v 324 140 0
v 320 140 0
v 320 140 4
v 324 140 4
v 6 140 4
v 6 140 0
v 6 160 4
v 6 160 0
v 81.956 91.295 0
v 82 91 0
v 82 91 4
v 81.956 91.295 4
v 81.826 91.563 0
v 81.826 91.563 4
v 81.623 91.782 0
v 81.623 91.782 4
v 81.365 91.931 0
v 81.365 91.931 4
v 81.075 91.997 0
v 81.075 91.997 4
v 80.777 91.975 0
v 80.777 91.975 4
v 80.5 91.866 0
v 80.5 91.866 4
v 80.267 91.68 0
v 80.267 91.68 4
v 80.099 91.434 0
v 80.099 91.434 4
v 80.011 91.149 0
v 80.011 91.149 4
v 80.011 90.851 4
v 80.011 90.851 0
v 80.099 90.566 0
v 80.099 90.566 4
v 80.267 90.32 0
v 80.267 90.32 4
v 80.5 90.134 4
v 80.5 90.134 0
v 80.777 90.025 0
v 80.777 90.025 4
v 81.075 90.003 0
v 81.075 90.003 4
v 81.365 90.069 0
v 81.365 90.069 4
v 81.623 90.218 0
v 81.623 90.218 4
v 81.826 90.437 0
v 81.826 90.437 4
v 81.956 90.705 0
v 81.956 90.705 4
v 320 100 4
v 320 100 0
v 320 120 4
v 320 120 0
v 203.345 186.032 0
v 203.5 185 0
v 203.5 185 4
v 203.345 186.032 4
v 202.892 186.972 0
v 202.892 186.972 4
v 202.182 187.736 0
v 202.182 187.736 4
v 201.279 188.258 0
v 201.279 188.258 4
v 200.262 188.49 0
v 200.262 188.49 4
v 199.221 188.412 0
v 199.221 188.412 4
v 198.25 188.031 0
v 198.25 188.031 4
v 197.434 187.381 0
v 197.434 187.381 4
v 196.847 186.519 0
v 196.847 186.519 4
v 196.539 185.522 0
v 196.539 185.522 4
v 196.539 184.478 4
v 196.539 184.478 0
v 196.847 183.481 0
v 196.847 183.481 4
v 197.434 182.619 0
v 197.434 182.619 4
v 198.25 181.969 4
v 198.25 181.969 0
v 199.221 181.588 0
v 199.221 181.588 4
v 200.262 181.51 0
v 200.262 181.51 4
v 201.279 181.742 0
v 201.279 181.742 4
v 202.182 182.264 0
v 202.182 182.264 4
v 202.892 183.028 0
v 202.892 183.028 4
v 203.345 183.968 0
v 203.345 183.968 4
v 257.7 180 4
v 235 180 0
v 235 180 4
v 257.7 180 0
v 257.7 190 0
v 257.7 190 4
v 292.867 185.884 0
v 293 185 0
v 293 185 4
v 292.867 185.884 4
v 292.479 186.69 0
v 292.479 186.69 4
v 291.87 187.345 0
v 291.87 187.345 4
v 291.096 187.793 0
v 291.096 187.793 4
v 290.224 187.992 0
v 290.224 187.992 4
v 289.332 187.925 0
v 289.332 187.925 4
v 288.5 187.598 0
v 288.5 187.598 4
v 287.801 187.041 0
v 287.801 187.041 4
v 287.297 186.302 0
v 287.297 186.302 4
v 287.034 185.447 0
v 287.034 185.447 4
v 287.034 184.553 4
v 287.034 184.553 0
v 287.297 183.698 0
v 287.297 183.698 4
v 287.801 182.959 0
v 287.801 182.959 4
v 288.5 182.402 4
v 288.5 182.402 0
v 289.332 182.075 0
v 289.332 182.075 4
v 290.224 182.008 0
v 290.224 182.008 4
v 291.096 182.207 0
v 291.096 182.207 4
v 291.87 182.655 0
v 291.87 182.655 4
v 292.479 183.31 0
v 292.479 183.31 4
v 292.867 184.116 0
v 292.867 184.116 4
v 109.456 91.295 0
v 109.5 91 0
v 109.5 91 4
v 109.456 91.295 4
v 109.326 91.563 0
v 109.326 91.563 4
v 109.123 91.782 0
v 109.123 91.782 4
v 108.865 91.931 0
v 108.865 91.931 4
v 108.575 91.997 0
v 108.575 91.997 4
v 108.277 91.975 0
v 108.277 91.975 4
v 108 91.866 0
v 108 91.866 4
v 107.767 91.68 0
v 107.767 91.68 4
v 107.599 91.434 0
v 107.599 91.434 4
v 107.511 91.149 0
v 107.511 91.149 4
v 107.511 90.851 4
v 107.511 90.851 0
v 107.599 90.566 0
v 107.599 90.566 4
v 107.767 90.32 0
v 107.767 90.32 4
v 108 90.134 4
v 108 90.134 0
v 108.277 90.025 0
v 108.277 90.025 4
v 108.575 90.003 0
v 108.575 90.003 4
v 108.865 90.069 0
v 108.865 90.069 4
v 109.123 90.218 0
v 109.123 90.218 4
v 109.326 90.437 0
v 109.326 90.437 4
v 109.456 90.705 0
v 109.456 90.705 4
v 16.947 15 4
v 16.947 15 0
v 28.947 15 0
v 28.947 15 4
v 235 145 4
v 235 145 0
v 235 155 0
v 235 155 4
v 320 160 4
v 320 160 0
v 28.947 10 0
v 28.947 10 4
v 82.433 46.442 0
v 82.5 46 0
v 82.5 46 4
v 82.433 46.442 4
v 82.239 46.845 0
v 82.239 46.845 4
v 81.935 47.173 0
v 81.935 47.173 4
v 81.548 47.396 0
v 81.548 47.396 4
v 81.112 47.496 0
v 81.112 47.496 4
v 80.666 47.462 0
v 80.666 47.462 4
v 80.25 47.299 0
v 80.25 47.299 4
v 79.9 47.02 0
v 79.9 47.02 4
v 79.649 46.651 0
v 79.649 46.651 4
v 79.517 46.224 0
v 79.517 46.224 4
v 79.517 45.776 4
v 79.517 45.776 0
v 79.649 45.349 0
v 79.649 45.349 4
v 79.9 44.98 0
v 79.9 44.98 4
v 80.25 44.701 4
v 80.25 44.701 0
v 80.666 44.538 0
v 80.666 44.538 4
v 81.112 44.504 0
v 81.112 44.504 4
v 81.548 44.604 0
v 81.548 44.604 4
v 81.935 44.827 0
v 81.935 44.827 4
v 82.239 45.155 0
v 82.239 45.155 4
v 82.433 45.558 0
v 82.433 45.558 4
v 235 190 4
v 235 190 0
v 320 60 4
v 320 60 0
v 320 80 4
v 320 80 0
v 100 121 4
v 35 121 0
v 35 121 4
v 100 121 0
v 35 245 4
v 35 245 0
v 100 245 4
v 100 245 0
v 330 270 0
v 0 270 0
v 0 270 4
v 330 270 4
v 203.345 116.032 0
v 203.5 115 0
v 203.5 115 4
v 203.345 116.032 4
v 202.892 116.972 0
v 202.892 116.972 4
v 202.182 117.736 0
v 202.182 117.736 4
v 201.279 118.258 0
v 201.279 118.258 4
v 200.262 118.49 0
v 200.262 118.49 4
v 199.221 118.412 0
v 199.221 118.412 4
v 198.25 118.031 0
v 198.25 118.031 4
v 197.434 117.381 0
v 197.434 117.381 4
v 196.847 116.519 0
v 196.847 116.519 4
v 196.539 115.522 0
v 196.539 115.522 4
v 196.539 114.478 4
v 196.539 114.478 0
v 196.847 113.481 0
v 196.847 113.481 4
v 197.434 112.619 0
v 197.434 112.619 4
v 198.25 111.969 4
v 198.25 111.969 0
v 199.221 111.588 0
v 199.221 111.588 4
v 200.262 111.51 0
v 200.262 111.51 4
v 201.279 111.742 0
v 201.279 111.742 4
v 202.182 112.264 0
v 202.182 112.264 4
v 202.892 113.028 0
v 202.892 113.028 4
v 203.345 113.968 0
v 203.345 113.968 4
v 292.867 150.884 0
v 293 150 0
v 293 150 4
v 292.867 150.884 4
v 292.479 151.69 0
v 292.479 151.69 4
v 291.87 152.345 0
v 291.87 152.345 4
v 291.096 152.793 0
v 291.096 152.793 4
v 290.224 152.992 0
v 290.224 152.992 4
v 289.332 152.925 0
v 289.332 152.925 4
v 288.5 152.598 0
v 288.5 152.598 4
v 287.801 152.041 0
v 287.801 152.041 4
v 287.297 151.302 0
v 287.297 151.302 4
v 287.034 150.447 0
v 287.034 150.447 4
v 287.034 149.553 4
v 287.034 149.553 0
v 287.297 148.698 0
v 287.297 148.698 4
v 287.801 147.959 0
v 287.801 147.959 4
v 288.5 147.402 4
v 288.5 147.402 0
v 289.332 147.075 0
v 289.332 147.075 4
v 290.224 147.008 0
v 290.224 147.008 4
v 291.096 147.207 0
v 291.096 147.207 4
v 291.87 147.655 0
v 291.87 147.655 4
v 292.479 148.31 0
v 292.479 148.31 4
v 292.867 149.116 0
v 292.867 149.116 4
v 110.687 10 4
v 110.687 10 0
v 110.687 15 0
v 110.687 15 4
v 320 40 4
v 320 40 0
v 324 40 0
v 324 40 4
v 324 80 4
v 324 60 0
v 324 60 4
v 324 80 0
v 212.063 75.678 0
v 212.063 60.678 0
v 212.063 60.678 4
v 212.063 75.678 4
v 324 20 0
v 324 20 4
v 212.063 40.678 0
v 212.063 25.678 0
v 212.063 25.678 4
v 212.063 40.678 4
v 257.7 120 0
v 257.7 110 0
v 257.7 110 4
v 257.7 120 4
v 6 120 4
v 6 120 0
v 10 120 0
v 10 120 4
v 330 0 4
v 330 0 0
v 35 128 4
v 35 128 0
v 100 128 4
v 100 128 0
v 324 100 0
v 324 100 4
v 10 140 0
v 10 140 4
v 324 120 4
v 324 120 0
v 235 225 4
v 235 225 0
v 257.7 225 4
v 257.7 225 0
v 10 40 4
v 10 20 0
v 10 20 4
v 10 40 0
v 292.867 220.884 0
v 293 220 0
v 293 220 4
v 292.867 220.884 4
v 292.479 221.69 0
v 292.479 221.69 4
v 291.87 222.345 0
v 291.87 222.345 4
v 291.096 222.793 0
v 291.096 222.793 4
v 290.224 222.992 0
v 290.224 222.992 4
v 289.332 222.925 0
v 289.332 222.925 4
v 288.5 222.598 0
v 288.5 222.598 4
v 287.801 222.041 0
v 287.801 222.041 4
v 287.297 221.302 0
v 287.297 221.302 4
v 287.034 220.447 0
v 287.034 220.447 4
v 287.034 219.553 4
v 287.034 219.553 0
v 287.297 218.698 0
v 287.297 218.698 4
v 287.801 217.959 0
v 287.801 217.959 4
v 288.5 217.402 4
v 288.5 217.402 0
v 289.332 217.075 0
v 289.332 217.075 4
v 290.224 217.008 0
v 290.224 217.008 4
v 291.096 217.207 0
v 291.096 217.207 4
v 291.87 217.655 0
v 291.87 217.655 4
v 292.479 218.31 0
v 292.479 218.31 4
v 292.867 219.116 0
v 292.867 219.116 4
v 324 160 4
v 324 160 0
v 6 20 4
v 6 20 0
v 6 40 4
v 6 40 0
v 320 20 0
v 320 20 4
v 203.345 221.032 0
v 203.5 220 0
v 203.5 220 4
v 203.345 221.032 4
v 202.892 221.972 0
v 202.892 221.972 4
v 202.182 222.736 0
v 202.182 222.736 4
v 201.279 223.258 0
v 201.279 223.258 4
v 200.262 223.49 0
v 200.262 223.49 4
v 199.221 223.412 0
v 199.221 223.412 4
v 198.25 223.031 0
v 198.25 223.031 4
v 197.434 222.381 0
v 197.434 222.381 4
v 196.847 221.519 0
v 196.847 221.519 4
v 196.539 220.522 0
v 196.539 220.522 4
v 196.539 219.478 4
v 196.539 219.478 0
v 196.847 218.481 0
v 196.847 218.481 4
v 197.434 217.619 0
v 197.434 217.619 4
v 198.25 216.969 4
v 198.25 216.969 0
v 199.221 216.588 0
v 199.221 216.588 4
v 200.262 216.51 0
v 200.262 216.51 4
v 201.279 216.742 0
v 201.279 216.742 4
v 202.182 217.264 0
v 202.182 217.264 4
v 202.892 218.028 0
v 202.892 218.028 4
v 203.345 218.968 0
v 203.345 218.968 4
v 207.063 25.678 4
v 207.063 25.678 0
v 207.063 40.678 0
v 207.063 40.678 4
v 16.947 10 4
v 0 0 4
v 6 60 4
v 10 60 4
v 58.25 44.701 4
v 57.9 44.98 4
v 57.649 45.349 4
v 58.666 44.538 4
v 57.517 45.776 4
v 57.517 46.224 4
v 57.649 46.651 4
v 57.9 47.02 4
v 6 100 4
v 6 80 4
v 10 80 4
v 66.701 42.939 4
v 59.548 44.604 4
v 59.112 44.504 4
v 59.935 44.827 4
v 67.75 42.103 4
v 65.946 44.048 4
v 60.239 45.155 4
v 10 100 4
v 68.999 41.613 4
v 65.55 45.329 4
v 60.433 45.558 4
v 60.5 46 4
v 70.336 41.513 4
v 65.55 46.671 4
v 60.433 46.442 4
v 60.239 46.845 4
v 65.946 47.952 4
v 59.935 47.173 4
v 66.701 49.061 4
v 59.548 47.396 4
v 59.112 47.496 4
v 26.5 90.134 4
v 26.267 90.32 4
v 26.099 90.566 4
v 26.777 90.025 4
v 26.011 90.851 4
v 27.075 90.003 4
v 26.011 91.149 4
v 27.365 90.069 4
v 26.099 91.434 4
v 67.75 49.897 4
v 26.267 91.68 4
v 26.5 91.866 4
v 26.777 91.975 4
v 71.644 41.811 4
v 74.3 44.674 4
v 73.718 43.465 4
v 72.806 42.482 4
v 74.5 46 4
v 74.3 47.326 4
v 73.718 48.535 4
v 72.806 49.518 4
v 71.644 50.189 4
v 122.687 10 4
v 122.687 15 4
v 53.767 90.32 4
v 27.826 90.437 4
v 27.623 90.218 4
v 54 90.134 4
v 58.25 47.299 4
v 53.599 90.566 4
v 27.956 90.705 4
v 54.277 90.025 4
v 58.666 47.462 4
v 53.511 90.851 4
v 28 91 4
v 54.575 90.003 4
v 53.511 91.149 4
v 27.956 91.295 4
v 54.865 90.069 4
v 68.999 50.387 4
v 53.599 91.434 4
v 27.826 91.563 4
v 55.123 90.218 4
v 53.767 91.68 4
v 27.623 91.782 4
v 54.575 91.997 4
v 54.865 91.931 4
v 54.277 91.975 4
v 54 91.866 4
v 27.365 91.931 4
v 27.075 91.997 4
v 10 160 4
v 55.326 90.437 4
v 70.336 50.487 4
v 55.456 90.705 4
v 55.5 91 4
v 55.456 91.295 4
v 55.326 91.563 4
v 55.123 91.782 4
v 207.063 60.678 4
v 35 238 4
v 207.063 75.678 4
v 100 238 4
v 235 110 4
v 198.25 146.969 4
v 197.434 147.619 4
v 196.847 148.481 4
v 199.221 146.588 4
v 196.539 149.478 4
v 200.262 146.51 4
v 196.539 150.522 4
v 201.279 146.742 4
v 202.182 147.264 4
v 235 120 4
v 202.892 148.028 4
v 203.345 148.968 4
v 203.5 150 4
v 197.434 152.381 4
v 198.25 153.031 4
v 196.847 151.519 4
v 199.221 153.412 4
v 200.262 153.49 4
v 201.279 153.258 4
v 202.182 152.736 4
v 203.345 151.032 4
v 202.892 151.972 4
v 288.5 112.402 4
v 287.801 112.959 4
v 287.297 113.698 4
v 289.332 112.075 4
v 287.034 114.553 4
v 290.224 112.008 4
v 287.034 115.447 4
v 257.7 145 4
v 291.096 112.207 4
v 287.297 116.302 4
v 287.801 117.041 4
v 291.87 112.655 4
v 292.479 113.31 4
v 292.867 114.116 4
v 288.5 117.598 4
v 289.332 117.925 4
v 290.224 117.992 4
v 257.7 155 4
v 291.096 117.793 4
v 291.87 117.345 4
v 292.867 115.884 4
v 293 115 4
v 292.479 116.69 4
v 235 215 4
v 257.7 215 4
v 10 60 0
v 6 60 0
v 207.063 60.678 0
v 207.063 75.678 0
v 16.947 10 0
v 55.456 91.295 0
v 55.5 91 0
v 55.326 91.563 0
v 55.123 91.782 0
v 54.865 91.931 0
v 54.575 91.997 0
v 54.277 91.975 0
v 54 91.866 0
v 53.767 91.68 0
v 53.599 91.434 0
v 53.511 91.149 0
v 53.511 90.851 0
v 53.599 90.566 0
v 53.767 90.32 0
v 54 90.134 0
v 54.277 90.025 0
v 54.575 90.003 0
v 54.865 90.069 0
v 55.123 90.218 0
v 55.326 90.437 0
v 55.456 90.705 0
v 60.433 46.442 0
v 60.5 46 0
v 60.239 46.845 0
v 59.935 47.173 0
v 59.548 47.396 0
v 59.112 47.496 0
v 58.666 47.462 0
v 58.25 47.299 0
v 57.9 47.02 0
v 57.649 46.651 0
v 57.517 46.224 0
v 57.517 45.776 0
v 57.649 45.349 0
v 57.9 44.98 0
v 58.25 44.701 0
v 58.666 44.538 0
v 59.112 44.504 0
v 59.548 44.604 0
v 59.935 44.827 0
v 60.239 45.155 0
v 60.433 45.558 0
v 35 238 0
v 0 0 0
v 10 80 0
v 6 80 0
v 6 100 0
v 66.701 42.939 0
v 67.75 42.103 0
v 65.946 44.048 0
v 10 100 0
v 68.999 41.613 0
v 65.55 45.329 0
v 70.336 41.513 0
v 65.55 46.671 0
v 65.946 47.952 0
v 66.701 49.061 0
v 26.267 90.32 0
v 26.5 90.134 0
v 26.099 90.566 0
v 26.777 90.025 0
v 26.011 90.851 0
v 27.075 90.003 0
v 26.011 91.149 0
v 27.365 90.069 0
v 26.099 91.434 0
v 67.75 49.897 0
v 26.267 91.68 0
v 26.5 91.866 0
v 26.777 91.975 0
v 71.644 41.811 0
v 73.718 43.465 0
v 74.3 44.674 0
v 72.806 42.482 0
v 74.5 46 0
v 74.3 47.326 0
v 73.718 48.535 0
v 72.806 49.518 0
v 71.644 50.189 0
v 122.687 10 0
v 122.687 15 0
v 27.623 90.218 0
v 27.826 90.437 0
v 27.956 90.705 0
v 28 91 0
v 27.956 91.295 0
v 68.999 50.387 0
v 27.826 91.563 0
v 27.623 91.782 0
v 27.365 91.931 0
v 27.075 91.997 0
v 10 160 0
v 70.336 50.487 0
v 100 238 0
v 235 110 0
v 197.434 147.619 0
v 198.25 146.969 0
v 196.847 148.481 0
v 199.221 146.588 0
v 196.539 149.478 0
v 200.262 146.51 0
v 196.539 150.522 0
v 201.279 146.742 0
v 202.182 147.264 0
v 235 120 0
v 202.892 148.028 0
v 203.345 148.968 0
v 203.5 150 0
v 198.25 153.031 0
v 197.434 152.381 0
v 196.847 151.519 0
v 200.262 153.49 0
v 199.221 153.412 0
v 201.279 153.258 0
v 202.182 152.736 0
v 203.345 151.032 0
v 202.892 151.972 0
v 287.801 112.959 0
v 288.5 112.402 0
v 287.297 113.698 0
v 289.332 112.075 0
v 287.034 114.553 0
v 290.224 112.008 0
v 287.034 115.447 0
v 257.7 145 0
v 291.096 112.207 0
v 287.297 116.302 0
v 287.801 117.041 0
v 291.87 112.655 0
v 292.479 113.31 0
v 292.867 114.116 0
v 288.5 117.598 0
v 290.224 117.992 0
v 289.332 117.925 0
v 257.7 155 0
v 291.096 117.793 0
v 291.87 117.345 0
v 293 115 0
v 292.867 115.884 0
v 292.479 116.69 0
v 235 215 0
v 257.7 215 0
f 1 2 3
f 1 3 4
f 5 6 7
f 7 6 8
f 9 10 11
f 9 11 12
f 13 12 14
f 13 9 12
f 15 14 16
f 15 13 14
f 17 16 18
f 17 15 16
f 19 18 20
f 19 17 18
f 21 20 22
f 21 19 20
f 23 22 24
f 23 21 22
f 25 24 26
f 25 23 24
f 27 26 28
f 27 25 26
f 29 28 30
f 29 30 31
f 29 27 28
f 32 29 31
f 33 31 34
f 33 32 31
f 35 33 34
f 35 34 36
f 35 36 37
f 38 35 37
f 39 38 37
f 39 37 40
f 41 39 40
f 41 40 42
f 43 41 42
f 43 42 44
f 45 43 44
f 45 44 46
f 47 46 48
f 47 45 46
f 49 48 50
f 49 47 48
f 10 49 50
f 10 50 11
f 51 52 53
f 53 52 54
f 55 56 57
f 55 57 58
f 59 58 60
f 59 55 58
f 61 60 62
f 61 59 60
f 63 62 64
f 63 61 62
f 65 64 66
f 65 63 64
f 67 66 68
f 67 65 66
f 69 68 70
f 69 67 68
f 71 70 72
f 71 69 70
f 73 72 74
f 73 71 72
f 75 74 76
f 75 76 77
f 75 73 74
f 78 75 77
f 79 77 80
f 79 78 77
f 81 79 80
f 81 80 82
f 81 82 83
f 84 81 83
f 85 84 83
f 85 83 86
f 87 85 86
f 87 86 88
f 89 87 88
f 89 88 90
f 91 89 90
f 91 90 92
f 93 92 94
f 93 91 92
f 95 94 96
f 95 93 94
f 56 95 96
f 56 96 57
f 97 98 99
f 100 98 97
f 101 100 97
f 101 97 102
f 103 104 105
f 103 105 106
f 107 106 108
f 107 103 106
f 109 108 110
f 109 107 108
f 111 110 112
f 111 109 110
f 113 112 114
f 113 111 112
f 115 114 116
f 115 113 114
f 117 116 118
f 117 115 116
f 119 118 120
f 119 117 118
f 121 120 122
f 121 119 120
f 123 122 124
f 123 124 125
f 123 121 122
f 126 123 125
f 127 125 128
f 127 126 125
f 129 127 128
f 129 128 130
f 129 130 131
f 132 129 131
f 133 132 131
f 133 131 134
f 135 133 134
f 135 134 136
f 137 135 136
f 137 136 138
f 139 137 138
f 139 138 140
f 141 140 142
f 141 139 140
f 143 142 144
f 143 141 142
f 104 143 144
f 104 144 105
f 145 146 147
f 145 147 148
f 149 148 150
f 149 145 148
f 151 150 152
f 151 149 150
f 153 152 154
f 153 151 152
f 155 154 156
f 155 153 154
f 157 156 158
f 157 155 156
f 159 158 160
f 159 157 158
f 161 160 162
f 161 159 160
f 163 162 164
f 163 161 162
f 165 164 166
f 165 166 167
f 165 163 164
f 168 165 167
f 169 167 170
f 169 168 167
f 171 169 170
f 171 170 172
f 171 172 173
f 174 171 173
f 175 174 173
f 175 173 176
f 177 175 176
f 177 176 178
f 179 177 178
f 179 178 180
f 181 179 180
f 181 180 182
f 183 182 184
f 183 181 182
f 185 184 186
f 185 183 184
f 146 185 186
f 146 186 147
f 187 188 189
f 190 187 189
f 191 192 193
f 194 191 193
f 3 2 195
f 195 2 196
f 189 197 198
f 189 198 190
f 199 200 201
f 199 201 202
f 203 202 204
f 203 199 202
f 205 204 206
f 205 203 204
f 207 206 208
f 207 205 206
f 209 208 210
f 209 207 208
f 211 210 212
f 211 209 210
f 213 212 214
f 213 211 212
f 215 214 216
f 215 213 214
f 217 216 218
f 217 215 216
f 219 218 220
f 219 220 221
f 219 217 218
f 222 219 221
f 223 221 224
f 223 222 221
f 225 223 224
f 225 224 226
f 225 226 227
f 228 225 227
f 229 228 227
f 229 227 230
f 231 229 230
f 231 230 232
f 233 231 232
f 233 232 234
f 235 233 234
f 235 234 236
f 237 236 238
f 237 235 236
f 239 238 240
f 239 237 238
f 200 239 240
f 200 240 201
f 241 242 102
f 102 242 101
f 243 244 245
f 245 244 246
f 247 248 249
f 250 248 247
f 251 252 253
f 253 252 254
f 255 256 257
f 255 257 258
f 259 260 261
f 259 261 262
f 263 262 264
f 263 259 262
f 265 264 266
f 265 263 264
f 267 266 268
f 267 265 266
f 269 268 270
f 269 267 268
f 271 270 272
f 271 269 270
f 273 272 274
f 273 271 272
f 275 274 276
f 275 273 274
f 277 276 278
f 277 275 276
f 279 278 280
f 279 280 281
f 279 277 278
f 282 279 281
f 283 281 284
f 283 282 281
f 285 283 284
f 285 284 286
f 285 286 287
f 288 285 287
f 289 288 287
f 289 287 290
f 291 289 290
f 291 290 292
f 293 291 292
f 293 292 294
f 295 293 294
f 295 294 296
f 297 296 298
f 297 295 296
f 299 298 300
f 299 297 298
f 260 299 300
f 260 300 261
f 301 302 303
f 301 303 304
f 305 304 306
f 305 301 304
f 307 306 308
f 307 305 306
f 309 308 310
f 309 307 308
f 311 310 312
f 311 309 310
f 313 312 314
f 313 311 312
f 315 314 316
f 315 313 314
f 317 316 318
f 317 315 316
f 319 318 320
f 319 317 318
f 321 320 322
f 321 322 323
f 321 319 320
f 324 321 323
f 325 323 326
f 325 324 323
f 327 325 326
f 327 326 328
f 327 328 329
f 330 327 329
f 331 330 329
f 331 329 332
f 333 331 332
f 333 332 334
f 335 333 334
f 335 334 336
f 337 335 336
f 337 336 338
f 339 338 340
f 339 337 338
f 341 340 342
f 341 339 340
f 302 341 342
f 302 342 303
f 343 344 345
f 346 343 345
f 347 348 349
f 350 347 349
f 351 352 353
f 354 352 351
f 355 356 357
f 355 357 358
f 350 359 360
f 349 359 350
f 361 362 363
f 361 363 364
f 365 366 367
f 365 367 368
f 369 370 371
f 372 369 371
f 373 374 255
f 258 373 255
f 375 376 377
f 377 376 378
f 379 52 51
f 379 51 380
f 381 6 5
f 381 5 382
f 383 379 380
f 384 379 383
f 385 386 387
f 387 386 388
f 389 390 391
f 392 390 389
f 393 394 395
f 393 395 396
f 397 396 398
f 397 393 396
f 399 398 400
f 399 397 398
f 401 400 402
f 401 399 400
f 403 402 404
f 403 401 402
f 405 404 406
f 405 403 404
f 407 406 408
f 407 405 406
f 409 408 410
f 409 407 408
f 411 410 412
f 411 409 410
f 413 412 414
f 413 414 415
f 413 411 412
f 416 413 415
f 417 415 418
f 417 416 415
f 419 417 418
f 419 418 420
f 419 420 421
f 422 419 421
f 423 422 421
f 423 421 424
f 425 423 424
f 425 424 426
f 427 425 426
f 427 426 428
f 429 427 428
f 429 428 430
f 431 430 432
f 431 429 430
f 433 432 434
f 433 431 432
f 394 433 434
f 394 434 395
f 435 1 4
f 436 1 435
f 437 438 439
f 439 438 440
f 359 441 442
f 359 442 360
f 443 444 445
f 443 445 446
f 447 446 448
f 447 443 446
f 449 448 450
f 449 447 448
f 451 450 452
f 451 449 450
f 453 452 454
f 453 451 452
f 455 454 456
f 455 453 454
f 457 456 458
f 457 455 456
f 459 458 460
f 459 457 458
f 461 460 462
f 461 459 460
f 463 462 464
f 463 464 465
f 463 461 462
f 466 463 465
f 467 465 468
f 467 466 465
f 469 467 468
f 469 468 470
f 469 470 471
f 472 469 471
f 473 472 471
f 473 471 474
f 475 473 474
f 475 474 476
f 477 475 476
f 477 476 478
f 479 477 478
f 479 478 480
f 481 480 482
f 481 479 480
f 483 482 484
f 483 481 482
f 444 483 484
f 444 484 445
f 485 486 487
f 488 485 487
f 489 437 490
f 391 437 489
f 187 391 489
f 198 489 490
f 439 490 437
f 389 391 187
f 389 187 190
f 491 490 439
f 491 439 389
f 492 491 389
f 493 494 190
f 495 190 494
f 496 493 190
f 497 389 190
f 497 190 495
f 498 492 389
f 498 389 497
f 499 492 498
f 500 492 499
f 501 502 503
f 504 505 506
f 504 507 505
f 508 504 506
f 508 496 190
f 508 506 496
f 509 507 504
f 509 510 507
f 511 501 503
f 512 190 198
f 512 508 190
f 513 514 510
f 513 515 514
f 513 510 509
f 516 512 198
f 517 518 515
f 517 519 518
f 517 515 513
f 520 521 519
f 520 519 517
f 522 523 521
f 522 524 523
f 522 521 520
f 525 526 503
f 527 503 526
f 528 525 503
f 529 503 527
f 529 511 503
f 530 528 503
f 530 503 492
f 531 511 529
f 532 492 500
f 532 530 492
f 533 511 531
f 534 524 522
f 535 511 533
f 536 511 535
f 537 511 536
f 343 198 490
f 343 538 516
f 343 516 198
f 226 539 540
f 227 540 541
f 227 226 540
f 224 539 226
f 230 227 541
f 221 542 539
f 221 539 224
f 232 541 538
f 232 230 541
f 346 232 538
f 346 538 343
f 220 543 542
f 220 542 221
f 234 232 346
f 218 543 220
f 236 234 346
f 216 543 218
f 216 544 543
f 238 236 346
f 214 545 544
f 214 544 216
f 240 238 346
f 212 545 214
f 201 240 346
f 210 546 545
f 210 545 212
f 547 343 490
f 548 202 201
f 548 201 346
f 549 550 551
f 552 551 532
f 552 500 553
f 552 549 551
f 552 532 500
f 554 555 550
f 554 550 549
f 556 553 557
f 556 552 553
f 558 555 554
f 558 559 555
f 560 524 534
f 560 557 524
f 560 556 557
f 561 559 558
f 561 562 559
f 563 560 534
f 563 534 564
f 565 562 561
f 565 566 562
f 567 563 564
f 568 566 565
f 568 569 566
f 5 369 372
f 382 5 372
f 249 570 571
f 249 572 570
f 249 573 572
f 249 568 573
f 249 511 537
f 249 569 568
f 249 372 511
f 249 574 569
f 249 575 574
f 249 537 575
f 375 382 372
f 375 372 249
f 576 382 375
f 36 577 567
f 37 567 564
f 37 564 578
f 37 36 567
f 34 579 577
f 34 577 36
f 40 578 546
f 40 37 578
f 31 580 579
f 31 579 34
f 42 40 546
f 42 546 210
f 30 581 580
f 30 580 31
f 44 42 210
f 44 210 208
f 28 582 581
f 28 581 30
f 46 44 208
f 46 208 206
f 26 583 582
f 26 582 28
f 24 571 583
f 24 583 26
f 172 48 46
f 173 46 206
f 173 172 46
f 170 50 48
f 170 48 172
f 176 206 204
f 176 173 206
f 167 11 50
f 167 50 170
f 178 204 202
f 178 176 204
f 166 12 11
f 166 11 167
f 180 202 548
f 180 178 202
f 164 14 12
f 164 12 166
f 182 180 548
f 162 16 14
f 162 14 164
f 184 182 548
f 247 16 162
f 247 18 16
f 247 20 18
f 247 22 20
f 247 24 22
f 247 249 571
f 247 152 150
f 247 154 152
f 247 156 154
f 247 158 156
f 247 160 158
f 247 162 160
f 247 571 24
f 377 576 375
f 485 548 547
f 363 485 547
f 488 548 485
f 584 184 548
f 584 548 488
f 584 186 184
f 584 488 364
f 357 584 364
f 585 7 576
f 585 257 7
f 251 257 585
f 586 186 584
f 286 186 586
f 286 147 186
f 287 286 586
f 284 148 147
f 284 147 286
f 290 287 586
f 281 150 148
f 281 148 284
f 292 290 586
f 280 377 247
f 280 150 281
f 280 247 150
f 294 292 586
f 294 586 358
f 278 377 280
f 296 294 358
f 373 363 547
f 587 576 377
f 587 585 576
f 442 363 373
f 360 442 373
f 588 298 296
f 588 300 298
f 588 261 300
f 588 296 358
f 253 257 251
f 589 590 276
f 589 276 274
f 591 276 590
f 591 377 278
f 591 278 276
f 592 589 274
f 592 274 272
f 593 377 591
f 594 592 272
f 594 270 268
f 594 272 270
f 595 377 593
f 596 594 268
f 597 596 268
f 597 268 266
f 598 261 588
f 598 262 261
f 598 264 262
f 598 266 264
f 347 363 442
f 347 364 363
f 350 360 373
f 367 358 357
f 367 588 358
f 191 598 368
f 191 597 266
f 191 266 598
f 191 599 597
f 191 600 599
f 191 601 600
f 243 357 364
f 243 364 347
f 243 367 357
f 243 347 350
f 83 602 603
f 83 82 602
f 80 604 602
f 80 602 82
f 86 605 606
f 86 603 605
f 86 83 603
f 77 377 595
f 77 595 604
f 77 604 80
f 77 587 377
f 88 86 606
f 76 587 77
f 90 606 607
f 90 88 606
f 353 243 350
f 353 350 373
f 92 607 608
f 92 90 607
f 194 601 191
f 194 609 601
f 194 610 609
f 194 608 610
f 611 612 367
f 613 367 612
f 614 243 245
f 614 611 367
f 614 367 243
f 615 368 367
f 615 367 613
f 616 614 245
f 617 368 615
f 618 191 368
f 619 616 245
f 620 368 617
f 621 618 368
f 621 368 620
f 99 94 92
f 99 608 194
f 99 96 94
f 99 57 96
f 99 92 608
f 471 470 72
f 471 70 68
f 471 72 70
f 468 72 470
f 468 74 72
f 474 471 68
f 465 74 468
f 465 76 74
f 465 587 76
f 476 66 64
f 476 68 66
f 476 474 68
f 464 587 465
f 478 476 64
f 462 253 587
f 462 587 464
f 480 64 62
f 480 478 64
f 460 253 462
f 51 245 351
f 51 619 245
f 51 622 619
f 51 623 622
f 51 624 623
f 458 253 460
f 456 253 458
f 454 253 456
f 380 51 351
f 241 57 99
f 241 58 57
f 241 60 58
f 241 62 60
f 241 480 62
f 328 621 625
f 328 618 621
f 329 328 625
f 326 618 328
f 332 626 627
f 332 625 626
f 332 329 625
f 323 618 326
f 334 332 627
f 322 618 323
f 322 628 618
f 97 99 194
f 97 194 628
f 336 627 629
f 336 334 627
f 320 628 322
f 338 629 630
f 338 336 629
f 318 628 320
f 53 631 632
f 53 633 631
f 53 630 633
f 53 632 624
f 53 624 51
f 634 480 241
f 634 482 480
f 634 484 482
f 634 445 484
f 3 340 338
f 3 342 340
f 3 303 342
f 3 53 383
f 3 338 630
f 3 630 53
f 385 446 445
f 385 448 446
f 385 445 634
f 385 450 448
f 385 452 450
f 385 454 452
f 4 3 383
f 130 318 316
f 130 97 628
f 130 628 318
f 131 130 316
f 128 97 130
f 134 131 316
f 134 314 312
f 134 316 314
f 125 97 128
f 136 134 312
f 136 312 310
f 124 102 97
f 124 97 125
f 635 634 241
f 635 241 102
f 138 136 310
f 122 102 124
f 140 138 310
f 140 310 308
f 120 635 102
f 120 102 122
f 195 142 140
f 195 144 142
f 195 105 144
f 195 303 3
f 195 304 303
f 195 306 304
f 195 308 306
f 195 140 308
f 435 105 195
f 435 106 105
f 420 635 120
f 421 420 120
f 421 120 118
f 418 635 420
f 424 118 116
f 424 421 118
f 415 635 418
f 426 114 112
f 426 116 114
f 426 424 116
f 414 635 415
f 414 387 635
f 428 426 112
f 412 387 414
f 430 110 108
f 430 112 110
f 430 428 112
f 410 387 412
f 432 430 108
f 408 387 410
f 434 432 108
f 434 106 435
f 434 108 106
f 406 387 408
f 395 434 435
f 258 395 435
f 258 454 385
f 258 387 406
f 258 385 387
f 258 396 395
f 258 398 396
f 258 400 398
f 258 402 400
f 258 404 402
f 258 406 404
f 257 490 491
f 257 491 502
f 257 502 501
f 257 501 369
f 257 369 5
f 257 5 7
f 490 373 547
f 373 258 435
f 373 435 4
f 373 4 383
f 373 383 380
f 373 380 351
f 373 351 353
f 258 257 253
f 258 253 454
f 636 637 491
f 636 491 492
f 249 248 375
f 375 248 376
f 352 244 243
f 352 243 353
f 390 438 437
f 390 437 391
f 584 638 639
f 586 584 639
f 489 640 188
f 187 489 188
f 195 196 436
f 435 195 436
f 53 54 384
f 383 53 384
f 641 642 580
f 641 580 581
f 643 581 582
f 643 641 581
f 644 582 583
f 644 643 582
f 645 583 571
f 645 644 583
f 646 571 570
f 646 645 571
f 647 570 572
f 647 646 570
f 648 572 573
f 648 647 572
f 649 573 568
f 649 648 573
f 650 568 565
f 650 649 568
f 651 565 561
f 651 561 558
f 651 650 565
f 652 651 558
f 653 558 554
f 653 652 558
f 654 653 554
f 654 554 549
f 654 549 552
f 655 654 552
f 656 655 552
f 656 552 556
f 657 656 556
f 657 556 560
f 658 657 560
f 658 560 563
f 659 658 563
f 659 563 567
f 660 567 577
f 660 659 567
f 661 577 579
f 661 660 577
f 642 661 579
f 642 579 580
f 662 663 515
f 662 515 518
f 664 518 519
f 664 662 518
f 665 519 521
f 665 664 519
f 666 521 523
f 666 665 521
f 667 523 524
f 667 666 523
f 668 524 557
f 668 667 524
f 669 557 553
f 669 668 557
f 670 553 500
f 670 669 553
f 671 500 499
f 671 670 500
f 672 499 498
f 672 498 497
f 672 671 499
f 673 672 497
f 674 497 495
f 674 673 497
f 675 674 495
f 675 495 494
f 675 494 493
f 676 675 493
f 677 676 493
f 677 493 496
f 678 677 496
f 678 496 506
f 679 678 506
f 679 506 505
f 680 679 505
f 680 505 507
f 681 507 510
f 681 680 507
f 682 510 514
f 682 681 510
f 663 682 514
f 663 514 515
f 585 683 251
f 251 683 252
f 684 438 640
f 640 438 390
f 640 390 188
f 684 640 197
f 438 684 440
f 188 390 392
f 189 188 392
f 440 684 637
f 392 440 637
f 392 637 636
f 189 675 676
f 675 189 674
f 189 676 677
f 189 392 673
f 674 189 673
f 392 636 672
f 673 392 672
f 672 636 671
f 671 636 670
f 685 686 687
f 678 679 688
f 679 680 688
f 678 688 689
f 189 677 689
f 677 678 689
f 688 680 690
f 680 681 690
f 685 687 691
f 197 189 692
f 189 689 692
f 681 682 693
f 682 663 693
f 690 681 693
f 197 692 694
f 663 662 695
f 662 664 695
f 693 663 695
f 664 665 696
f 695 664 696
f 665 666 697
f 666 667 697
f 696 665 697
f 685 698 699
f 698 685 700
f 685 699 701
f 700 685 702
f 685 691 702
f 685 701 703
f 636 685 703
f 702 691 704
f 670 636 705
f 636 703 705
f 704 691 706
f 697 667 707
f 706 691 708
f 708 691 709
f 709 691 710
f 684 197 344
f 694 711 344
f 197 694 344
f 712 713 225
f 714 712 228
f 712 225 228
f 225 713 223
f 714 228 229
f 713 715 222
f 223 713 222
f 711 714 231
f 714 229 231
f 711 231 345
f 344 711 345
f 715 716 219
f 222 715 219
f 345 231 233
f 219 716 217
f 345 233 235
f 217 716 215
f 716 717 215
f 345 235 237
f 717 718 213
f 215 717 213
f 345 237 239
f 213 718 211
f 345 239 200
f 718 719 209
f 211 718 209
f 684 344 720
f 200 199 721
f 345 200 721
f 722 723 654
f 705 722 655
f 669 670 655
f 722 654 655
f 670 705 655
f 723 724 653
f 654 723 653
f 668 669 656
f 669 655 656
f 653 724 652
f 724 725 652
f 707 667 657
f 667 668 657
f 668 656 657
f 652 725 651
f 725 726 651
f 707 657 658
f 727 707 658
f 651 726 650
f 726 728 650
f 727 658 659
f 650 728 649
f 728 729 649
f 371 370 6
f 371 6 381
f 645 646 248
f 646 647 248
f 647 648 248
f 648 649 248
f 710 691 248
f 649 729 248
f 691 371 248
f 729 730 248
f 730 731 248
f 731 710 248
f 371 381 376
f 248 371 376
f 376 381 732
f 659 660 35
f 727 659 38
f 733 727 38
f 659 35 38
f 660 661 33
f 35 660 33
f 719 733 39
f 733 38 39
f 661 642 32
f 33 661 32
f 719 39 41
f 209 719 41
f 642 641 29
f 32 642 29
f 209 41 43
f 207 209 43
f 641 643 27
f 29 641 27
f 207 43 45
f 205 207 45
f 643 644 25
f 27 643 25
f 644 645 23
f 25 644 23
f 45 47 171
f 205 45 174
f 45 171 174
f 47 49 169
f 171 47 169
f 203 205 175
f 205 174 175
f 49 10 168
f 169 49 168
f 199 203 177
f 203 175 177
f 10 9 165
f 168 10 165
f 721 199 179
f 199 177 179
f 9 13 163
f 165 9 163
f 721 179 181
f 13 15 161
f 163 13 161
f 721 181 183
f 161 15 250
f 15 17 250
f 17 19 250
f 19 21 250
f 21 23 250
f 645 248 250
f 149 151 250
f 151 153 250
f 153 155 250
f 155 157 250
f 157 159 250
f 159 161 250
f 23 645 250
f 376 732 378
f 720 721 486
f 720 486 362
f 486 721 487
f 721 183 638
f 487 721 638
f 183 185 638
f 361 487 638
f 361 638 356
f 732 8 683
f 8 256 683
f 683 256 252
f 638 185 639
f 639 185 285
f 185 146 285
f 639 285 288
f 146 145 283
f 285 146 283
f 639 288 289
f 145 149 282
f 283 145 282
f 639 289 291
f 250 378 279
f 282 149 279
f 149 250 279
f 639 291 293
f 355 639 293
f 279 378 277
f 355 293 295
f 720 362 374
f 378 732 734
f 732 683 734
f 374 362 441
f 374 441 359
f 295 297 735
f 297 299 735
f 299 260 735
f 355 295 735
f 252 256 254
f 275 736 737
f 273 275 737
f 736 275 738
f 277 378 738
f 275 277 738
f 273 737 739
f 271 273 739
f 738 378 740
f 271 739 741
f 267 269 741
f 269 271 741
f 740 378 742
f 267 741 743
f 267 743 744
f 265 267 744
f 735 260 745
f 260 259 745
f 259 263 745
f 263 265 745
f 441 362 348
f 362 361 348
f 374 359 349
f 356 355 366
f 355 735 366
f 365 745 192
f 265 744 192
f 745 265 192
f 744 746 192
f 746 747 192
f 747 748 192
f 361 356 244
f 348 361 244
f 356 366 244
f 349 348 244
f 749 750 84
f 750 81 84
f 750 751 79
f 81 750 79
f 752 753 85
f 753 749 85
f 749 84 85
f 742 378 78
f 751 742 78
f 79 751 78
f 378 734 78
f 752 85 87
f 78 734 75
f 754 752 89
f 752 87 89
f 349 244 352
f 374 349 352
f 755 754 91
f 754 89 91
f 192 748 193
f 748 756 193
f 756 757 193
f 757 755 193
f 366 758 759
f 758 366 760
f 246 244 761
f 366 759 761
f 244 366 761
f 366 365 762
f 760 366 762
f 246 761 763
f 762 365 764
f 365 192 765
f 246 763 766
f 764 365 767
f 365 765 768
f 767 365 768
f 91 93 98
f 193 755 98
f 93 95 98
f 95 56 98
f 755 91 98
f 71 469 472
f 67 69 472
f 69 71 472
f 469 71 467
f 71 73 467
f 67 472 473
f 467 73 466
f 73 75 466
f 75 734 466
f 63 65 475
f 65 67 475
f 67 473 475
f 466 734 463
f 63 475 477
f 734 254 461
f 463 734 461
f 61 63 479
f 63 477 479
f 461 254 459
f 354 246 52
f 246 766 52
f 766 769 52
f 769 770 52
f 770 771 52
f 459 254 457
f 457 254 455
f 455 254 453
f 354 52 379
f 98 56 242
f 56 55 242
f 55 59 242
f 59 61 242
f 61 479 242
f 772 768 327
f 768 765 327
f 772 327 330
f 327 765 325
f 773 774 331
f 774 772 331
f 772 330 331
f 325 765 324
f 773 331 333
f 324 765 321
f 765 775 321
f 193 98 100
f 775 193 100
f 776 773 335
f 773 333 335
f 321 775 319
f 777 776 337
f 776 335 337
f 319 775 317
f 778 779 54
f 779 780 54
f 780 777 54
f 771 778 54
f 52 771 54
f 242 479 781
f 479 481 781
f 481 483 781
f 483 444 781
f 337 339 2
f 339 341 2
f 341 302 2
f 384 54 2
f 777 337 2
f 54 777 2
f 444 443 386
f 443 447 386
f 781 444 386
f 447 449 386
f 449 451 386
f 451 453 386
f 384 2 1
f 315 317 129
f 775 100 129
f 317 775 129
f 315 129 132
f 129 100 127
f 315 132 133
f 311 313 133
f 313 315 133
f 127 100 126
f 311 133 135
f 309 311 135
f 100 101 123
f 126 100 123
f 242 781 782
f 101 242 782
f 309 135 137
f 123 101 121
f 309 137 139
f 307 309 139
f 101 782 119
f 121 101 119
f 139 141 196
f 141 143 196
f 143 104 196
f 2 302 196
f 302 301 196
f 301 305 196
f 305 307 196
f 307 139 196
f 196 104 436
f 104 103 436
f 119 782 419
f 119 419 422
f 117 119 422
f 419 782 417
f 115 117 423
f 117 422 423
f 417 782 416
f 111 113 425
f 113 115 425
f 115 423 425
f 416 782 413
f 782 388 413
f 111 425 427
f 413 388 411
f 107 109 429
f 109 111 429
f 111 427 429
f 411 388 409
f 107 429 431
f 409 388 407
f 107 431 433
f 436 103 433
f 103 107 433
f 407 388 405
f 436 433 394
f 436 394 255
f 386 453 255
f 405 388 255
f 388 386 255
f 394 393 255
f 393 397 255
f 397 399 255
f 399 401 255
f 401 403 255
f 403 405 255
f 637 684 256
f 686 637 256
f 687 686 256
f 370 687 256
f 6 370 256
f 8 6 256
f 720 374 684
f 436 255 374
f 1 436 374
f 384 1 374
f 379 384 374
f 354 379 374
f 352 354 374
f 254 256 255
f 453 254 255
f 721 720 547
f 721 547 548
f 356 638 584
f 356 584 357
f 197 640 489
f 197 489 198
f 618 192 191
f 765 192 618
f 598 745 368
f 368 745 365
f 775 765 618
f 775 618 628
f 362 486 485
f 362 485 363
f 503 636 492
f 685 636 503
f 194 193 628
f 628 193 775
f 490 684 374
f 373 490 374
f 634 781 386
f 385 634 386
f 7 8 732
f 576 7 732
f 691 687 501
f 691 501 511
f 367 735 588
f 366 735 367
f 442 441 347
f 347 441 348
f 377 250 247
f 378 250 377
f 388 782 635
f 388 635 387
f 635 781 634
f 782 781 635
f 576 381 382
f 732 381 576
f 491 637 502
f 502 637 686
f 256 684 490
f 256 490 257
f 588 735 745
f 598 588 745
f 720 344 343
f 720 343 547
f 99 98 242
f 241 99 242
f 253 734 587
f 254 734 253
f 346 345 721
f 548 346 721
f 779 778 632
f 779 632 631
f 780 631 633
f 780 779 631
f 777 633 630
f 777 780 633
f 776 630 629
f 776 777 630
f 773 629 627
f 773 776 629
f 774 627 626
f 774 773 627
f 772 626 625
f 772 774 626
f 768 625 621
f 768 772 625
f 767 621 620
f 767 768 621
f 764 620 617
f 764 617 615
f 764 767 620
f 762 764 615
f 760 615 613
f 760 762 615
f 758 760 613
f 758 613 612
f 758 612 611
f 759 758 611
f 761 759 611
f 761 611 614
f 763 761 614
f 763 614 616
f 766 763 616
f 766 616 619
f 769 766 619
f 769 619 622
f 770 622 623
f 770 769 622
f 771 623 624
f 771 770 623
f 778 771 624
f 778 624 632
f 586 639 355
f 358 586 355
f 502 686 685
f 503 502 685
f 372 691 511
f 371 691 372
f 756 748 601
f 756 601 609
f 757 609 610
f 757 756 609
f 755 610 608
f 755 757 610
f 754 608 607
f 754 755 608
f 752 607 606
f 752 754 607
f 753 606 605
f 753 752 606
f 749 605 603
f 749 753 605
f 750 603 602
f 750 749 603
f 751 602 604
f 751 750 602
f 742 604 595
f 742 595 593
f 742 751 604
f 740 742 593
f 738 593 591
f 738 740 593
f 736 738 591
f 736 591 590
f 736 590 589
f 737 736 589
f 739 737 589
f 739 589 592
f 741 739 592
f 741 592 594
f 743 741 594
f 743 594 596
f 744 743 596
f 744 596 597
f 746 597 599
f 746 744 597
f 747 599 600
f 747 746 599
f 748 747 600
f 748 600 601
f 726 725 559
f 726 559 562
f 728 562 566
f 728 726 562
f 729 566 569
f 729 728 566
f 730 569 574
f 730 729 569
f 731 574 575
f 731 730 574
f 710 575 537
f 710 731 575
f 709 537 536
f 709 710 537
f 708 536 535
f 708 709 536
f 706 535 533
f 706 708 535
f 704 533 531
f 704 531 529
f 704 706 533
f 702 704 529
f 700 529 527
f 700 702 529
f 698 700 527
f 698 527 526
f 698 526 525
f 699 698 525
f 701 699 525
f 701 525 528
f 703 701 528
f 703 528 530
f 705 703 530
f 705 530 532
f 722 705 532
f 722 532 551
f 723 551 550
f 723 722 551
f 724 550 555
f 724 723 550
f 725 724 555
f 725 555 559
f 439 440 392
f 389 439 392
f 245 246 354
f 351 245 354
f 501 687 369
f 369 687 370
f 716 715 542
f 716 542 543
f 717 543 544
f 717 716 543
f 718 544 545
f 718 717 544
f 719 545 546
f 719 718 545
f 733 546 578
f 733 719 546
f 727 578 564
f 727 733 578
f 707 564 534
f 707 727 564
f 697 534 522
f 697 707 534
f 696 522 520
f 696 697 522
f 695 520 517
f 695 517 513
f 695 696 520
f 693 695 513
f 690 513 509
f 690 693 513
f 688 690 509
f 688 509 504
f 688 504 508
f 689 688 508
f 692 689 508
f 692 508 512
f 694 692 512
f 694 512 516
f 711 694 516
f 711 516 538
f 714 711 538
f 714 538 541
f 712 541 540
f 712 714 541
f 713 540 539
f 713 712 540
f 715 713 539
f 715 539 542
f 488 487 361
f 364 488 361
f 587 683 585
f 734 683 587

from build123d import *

# Parameters (mm, degrees)
SCHIZZO1_W                   = 330
SCHIZZO1_H                   = 270
SCHIZZO1_R                   = 3.5
SCHIZZO1_R_2                 = 1
SCHIZZO1_R_3                 = 3
SCHIZZO1_R_4                 = 4.5
SCHIZZO1_R_5                 = 1.5
SCHIZZO1_W_2                 = 22.7
SCHIZZO1_H_2                 = 10
SCHIZZO1_W_3                 = 65
SCHIZZO1_H_3                 = 7
SCHIZZO1_W_4                 = 4
SCHIZZO1_H_4                 = 20
SCHIZZO1_W_5                 = 5
SCHIZZO1_H_5                 = 15
SCHIZZO1_W_6                 = 12
SCHIZZO1_H_6                 = 5
ESTRUSIONE_ESTRUSIONE1_DEPTH = 4


with BuildPart() as part:
    # Schizzo1 → Estrusione-Estrusione1 (new body)
    with BuildSketch(Plane.XY):
        with Locations((165, 135)):
            Rectangle(SCHIZZO1_W, SCHIZZO1_H)
        with Locations((200, 220)):
            Circle(SCHIZZO1_R, mode=Mode.SUBTRACT)
        with Locations((200, 185)):
            Circle(SCHIZZO1_R, mode=Mode.SUBTRACT)
        with Locations((200, 150)):
            Circle(SCHIZZO1_R, mode=Mode.SUBTRACT)
        with Locations((200, 115)):
            Circle(SCHIZZO1_R, mode=Mode.SUBTRACT)
        with Locations((27, 91)):
            Circle(SCHIZZO1_R_2, mode=Mode.SUBTRACT)
        with Locations((54.5, 91)):
            Circle(SCHIZZO1_R_2, mode=Mode.SUBTRACT)
        with Locations((81, 91)):
            Circle(SCHIZZO1_R_2, mode=Mode.SUBTRACT)
        with Locations((108.5, 91)):
            Circle(SCHIZZO1_R_2, mode=Mode.SUBTRACT)
        with Locations((290, 220)):
            Circle(SCHIZZO1_R_3, mode=Mode.SUBTRACT)
        with Locations((290, 185)):
            Circle(SCHIZZO1_R_3, mode=Mode.SUBTRACT)
        with Locations((290, 150)):
            Circle(SCHIZZO1_R_3, mode=Mode.SUBTRACT)
        with Locations((290, 115)):
            Circle(SCHIZZO1_R_3, mode=Mode.SUBTRACT)
        with Locations((70, 46)):
            Circle(SCHIZZO1_R_4, mode=Mode.SUBTRACT)
        with Locations((59, 46)):
            Circle(SCHIZZO1_R_5, mode=Mode.SUBTRACT)
        with Locations((81, 46)):
            Circle(SCHIZZO1_R_5, mode=Mode.SUBTRACT)
        with Locations((246.35, 185)):
            Rectangle(SCHIZZO1_W_2, SCHIZZO1_H_2, mode=Mode.SUBTRACT)
        with Locations((67.5, 241.5)):
            Rectangle(SCHIZZO1_W_3, SCHIZZO1_H_3, mode=Mode.SUBTRACT)
        with Locations((246.35, 220)):
            Rectangle(SCHIZZO1_W_2, SCHIZZO1_H_2, mode=Mode.SUBTRACT)
        with Locations((246.35, 150)):
            Rectangle(SCHIZZO1_W_2, SCHIZZO1_H_2, mode=Mode.SUBTRACT)
        with Locations((246.35, 115)):
            Rectangle(SCHIZZO1_W_2, SCHIZZO1_H_2, mode=Mode.SUBTRACT)
        with Locations((8, 110)):
            Rectangle(SCHIZZO1_W_4, SCHIZZO1_H_4, mode=Mode.SUBTRACT)
        with Locations((67.5, 124.5)):
            Rectangle(SCHIZZO1_W_3, SCHIZZO1_H_3, mode=Mode.SUBTRACT)
        with Locations((209.563268788, 68.177868744)):
            Rectangle(SCHIZZO1_W_5, SCHIZZO1_H_5, mode=Mode.SUBTRACT)
        with Locations((22.947077827, 12.5)):
            Rectangle(SCHIZZO1_W_6, SCHIZZO1_H_6, mode=Mode.SUBTRACT)
        with Locations((116.687234465, 12.5)):
            Rectangle(SCHIZZO1_W_6, SCHIZZO1_H_6, mode=Mode.SUBTRACT)
        with Locations((209.563268788, 33.177868744)):
            Rectangle(SCHIZZO1_W_5, SCHIZZO1_H_5, mode=Mode.SUBTRACT)
        with Locations((8, 150)):
            Rectangle(SCHIZZO1_W_4, SCHIZZO1_H_4, mode=Mode.SUBTRACT)
        with Locations((8, 70)):
            Rectangle(SCHIZZO1_W_4, SCHIZZO1_H_4, mode=Mode.SUBTRACT)
        with Locations((8, 30)):
            Rectangle(SCHIZZO1_W_4, SCHIZZO1_H_4, mode=Mode.SUBTRACT)
        with Locations((322, 110)):
            Rectangle(SCHIZZO1_W_4, SCHIZZO1_H_4, mode=Mode.SUBTRACT)
        with Locations((322, 150)):
            Rectangle(SCHIZZO1_W_4, SCHIZZO1_H_4, mode=Mode.SUBTRACT)
        with Locations((322, 70)):
            Rectangle(SCHIZZO1_W_4, SCHIZZO1_H_4, mode=Mode.SUBTRACT)
        with Locations((322, 30)):
            Rectangle(SCHIZZO1_W_4, SCHIZZO1_H_4, mode=Mode.SUBTRACT)
    extrude(amount=ESTRUSIONE_ESTRUSIONE1_DEPTH)


solid = part.part
